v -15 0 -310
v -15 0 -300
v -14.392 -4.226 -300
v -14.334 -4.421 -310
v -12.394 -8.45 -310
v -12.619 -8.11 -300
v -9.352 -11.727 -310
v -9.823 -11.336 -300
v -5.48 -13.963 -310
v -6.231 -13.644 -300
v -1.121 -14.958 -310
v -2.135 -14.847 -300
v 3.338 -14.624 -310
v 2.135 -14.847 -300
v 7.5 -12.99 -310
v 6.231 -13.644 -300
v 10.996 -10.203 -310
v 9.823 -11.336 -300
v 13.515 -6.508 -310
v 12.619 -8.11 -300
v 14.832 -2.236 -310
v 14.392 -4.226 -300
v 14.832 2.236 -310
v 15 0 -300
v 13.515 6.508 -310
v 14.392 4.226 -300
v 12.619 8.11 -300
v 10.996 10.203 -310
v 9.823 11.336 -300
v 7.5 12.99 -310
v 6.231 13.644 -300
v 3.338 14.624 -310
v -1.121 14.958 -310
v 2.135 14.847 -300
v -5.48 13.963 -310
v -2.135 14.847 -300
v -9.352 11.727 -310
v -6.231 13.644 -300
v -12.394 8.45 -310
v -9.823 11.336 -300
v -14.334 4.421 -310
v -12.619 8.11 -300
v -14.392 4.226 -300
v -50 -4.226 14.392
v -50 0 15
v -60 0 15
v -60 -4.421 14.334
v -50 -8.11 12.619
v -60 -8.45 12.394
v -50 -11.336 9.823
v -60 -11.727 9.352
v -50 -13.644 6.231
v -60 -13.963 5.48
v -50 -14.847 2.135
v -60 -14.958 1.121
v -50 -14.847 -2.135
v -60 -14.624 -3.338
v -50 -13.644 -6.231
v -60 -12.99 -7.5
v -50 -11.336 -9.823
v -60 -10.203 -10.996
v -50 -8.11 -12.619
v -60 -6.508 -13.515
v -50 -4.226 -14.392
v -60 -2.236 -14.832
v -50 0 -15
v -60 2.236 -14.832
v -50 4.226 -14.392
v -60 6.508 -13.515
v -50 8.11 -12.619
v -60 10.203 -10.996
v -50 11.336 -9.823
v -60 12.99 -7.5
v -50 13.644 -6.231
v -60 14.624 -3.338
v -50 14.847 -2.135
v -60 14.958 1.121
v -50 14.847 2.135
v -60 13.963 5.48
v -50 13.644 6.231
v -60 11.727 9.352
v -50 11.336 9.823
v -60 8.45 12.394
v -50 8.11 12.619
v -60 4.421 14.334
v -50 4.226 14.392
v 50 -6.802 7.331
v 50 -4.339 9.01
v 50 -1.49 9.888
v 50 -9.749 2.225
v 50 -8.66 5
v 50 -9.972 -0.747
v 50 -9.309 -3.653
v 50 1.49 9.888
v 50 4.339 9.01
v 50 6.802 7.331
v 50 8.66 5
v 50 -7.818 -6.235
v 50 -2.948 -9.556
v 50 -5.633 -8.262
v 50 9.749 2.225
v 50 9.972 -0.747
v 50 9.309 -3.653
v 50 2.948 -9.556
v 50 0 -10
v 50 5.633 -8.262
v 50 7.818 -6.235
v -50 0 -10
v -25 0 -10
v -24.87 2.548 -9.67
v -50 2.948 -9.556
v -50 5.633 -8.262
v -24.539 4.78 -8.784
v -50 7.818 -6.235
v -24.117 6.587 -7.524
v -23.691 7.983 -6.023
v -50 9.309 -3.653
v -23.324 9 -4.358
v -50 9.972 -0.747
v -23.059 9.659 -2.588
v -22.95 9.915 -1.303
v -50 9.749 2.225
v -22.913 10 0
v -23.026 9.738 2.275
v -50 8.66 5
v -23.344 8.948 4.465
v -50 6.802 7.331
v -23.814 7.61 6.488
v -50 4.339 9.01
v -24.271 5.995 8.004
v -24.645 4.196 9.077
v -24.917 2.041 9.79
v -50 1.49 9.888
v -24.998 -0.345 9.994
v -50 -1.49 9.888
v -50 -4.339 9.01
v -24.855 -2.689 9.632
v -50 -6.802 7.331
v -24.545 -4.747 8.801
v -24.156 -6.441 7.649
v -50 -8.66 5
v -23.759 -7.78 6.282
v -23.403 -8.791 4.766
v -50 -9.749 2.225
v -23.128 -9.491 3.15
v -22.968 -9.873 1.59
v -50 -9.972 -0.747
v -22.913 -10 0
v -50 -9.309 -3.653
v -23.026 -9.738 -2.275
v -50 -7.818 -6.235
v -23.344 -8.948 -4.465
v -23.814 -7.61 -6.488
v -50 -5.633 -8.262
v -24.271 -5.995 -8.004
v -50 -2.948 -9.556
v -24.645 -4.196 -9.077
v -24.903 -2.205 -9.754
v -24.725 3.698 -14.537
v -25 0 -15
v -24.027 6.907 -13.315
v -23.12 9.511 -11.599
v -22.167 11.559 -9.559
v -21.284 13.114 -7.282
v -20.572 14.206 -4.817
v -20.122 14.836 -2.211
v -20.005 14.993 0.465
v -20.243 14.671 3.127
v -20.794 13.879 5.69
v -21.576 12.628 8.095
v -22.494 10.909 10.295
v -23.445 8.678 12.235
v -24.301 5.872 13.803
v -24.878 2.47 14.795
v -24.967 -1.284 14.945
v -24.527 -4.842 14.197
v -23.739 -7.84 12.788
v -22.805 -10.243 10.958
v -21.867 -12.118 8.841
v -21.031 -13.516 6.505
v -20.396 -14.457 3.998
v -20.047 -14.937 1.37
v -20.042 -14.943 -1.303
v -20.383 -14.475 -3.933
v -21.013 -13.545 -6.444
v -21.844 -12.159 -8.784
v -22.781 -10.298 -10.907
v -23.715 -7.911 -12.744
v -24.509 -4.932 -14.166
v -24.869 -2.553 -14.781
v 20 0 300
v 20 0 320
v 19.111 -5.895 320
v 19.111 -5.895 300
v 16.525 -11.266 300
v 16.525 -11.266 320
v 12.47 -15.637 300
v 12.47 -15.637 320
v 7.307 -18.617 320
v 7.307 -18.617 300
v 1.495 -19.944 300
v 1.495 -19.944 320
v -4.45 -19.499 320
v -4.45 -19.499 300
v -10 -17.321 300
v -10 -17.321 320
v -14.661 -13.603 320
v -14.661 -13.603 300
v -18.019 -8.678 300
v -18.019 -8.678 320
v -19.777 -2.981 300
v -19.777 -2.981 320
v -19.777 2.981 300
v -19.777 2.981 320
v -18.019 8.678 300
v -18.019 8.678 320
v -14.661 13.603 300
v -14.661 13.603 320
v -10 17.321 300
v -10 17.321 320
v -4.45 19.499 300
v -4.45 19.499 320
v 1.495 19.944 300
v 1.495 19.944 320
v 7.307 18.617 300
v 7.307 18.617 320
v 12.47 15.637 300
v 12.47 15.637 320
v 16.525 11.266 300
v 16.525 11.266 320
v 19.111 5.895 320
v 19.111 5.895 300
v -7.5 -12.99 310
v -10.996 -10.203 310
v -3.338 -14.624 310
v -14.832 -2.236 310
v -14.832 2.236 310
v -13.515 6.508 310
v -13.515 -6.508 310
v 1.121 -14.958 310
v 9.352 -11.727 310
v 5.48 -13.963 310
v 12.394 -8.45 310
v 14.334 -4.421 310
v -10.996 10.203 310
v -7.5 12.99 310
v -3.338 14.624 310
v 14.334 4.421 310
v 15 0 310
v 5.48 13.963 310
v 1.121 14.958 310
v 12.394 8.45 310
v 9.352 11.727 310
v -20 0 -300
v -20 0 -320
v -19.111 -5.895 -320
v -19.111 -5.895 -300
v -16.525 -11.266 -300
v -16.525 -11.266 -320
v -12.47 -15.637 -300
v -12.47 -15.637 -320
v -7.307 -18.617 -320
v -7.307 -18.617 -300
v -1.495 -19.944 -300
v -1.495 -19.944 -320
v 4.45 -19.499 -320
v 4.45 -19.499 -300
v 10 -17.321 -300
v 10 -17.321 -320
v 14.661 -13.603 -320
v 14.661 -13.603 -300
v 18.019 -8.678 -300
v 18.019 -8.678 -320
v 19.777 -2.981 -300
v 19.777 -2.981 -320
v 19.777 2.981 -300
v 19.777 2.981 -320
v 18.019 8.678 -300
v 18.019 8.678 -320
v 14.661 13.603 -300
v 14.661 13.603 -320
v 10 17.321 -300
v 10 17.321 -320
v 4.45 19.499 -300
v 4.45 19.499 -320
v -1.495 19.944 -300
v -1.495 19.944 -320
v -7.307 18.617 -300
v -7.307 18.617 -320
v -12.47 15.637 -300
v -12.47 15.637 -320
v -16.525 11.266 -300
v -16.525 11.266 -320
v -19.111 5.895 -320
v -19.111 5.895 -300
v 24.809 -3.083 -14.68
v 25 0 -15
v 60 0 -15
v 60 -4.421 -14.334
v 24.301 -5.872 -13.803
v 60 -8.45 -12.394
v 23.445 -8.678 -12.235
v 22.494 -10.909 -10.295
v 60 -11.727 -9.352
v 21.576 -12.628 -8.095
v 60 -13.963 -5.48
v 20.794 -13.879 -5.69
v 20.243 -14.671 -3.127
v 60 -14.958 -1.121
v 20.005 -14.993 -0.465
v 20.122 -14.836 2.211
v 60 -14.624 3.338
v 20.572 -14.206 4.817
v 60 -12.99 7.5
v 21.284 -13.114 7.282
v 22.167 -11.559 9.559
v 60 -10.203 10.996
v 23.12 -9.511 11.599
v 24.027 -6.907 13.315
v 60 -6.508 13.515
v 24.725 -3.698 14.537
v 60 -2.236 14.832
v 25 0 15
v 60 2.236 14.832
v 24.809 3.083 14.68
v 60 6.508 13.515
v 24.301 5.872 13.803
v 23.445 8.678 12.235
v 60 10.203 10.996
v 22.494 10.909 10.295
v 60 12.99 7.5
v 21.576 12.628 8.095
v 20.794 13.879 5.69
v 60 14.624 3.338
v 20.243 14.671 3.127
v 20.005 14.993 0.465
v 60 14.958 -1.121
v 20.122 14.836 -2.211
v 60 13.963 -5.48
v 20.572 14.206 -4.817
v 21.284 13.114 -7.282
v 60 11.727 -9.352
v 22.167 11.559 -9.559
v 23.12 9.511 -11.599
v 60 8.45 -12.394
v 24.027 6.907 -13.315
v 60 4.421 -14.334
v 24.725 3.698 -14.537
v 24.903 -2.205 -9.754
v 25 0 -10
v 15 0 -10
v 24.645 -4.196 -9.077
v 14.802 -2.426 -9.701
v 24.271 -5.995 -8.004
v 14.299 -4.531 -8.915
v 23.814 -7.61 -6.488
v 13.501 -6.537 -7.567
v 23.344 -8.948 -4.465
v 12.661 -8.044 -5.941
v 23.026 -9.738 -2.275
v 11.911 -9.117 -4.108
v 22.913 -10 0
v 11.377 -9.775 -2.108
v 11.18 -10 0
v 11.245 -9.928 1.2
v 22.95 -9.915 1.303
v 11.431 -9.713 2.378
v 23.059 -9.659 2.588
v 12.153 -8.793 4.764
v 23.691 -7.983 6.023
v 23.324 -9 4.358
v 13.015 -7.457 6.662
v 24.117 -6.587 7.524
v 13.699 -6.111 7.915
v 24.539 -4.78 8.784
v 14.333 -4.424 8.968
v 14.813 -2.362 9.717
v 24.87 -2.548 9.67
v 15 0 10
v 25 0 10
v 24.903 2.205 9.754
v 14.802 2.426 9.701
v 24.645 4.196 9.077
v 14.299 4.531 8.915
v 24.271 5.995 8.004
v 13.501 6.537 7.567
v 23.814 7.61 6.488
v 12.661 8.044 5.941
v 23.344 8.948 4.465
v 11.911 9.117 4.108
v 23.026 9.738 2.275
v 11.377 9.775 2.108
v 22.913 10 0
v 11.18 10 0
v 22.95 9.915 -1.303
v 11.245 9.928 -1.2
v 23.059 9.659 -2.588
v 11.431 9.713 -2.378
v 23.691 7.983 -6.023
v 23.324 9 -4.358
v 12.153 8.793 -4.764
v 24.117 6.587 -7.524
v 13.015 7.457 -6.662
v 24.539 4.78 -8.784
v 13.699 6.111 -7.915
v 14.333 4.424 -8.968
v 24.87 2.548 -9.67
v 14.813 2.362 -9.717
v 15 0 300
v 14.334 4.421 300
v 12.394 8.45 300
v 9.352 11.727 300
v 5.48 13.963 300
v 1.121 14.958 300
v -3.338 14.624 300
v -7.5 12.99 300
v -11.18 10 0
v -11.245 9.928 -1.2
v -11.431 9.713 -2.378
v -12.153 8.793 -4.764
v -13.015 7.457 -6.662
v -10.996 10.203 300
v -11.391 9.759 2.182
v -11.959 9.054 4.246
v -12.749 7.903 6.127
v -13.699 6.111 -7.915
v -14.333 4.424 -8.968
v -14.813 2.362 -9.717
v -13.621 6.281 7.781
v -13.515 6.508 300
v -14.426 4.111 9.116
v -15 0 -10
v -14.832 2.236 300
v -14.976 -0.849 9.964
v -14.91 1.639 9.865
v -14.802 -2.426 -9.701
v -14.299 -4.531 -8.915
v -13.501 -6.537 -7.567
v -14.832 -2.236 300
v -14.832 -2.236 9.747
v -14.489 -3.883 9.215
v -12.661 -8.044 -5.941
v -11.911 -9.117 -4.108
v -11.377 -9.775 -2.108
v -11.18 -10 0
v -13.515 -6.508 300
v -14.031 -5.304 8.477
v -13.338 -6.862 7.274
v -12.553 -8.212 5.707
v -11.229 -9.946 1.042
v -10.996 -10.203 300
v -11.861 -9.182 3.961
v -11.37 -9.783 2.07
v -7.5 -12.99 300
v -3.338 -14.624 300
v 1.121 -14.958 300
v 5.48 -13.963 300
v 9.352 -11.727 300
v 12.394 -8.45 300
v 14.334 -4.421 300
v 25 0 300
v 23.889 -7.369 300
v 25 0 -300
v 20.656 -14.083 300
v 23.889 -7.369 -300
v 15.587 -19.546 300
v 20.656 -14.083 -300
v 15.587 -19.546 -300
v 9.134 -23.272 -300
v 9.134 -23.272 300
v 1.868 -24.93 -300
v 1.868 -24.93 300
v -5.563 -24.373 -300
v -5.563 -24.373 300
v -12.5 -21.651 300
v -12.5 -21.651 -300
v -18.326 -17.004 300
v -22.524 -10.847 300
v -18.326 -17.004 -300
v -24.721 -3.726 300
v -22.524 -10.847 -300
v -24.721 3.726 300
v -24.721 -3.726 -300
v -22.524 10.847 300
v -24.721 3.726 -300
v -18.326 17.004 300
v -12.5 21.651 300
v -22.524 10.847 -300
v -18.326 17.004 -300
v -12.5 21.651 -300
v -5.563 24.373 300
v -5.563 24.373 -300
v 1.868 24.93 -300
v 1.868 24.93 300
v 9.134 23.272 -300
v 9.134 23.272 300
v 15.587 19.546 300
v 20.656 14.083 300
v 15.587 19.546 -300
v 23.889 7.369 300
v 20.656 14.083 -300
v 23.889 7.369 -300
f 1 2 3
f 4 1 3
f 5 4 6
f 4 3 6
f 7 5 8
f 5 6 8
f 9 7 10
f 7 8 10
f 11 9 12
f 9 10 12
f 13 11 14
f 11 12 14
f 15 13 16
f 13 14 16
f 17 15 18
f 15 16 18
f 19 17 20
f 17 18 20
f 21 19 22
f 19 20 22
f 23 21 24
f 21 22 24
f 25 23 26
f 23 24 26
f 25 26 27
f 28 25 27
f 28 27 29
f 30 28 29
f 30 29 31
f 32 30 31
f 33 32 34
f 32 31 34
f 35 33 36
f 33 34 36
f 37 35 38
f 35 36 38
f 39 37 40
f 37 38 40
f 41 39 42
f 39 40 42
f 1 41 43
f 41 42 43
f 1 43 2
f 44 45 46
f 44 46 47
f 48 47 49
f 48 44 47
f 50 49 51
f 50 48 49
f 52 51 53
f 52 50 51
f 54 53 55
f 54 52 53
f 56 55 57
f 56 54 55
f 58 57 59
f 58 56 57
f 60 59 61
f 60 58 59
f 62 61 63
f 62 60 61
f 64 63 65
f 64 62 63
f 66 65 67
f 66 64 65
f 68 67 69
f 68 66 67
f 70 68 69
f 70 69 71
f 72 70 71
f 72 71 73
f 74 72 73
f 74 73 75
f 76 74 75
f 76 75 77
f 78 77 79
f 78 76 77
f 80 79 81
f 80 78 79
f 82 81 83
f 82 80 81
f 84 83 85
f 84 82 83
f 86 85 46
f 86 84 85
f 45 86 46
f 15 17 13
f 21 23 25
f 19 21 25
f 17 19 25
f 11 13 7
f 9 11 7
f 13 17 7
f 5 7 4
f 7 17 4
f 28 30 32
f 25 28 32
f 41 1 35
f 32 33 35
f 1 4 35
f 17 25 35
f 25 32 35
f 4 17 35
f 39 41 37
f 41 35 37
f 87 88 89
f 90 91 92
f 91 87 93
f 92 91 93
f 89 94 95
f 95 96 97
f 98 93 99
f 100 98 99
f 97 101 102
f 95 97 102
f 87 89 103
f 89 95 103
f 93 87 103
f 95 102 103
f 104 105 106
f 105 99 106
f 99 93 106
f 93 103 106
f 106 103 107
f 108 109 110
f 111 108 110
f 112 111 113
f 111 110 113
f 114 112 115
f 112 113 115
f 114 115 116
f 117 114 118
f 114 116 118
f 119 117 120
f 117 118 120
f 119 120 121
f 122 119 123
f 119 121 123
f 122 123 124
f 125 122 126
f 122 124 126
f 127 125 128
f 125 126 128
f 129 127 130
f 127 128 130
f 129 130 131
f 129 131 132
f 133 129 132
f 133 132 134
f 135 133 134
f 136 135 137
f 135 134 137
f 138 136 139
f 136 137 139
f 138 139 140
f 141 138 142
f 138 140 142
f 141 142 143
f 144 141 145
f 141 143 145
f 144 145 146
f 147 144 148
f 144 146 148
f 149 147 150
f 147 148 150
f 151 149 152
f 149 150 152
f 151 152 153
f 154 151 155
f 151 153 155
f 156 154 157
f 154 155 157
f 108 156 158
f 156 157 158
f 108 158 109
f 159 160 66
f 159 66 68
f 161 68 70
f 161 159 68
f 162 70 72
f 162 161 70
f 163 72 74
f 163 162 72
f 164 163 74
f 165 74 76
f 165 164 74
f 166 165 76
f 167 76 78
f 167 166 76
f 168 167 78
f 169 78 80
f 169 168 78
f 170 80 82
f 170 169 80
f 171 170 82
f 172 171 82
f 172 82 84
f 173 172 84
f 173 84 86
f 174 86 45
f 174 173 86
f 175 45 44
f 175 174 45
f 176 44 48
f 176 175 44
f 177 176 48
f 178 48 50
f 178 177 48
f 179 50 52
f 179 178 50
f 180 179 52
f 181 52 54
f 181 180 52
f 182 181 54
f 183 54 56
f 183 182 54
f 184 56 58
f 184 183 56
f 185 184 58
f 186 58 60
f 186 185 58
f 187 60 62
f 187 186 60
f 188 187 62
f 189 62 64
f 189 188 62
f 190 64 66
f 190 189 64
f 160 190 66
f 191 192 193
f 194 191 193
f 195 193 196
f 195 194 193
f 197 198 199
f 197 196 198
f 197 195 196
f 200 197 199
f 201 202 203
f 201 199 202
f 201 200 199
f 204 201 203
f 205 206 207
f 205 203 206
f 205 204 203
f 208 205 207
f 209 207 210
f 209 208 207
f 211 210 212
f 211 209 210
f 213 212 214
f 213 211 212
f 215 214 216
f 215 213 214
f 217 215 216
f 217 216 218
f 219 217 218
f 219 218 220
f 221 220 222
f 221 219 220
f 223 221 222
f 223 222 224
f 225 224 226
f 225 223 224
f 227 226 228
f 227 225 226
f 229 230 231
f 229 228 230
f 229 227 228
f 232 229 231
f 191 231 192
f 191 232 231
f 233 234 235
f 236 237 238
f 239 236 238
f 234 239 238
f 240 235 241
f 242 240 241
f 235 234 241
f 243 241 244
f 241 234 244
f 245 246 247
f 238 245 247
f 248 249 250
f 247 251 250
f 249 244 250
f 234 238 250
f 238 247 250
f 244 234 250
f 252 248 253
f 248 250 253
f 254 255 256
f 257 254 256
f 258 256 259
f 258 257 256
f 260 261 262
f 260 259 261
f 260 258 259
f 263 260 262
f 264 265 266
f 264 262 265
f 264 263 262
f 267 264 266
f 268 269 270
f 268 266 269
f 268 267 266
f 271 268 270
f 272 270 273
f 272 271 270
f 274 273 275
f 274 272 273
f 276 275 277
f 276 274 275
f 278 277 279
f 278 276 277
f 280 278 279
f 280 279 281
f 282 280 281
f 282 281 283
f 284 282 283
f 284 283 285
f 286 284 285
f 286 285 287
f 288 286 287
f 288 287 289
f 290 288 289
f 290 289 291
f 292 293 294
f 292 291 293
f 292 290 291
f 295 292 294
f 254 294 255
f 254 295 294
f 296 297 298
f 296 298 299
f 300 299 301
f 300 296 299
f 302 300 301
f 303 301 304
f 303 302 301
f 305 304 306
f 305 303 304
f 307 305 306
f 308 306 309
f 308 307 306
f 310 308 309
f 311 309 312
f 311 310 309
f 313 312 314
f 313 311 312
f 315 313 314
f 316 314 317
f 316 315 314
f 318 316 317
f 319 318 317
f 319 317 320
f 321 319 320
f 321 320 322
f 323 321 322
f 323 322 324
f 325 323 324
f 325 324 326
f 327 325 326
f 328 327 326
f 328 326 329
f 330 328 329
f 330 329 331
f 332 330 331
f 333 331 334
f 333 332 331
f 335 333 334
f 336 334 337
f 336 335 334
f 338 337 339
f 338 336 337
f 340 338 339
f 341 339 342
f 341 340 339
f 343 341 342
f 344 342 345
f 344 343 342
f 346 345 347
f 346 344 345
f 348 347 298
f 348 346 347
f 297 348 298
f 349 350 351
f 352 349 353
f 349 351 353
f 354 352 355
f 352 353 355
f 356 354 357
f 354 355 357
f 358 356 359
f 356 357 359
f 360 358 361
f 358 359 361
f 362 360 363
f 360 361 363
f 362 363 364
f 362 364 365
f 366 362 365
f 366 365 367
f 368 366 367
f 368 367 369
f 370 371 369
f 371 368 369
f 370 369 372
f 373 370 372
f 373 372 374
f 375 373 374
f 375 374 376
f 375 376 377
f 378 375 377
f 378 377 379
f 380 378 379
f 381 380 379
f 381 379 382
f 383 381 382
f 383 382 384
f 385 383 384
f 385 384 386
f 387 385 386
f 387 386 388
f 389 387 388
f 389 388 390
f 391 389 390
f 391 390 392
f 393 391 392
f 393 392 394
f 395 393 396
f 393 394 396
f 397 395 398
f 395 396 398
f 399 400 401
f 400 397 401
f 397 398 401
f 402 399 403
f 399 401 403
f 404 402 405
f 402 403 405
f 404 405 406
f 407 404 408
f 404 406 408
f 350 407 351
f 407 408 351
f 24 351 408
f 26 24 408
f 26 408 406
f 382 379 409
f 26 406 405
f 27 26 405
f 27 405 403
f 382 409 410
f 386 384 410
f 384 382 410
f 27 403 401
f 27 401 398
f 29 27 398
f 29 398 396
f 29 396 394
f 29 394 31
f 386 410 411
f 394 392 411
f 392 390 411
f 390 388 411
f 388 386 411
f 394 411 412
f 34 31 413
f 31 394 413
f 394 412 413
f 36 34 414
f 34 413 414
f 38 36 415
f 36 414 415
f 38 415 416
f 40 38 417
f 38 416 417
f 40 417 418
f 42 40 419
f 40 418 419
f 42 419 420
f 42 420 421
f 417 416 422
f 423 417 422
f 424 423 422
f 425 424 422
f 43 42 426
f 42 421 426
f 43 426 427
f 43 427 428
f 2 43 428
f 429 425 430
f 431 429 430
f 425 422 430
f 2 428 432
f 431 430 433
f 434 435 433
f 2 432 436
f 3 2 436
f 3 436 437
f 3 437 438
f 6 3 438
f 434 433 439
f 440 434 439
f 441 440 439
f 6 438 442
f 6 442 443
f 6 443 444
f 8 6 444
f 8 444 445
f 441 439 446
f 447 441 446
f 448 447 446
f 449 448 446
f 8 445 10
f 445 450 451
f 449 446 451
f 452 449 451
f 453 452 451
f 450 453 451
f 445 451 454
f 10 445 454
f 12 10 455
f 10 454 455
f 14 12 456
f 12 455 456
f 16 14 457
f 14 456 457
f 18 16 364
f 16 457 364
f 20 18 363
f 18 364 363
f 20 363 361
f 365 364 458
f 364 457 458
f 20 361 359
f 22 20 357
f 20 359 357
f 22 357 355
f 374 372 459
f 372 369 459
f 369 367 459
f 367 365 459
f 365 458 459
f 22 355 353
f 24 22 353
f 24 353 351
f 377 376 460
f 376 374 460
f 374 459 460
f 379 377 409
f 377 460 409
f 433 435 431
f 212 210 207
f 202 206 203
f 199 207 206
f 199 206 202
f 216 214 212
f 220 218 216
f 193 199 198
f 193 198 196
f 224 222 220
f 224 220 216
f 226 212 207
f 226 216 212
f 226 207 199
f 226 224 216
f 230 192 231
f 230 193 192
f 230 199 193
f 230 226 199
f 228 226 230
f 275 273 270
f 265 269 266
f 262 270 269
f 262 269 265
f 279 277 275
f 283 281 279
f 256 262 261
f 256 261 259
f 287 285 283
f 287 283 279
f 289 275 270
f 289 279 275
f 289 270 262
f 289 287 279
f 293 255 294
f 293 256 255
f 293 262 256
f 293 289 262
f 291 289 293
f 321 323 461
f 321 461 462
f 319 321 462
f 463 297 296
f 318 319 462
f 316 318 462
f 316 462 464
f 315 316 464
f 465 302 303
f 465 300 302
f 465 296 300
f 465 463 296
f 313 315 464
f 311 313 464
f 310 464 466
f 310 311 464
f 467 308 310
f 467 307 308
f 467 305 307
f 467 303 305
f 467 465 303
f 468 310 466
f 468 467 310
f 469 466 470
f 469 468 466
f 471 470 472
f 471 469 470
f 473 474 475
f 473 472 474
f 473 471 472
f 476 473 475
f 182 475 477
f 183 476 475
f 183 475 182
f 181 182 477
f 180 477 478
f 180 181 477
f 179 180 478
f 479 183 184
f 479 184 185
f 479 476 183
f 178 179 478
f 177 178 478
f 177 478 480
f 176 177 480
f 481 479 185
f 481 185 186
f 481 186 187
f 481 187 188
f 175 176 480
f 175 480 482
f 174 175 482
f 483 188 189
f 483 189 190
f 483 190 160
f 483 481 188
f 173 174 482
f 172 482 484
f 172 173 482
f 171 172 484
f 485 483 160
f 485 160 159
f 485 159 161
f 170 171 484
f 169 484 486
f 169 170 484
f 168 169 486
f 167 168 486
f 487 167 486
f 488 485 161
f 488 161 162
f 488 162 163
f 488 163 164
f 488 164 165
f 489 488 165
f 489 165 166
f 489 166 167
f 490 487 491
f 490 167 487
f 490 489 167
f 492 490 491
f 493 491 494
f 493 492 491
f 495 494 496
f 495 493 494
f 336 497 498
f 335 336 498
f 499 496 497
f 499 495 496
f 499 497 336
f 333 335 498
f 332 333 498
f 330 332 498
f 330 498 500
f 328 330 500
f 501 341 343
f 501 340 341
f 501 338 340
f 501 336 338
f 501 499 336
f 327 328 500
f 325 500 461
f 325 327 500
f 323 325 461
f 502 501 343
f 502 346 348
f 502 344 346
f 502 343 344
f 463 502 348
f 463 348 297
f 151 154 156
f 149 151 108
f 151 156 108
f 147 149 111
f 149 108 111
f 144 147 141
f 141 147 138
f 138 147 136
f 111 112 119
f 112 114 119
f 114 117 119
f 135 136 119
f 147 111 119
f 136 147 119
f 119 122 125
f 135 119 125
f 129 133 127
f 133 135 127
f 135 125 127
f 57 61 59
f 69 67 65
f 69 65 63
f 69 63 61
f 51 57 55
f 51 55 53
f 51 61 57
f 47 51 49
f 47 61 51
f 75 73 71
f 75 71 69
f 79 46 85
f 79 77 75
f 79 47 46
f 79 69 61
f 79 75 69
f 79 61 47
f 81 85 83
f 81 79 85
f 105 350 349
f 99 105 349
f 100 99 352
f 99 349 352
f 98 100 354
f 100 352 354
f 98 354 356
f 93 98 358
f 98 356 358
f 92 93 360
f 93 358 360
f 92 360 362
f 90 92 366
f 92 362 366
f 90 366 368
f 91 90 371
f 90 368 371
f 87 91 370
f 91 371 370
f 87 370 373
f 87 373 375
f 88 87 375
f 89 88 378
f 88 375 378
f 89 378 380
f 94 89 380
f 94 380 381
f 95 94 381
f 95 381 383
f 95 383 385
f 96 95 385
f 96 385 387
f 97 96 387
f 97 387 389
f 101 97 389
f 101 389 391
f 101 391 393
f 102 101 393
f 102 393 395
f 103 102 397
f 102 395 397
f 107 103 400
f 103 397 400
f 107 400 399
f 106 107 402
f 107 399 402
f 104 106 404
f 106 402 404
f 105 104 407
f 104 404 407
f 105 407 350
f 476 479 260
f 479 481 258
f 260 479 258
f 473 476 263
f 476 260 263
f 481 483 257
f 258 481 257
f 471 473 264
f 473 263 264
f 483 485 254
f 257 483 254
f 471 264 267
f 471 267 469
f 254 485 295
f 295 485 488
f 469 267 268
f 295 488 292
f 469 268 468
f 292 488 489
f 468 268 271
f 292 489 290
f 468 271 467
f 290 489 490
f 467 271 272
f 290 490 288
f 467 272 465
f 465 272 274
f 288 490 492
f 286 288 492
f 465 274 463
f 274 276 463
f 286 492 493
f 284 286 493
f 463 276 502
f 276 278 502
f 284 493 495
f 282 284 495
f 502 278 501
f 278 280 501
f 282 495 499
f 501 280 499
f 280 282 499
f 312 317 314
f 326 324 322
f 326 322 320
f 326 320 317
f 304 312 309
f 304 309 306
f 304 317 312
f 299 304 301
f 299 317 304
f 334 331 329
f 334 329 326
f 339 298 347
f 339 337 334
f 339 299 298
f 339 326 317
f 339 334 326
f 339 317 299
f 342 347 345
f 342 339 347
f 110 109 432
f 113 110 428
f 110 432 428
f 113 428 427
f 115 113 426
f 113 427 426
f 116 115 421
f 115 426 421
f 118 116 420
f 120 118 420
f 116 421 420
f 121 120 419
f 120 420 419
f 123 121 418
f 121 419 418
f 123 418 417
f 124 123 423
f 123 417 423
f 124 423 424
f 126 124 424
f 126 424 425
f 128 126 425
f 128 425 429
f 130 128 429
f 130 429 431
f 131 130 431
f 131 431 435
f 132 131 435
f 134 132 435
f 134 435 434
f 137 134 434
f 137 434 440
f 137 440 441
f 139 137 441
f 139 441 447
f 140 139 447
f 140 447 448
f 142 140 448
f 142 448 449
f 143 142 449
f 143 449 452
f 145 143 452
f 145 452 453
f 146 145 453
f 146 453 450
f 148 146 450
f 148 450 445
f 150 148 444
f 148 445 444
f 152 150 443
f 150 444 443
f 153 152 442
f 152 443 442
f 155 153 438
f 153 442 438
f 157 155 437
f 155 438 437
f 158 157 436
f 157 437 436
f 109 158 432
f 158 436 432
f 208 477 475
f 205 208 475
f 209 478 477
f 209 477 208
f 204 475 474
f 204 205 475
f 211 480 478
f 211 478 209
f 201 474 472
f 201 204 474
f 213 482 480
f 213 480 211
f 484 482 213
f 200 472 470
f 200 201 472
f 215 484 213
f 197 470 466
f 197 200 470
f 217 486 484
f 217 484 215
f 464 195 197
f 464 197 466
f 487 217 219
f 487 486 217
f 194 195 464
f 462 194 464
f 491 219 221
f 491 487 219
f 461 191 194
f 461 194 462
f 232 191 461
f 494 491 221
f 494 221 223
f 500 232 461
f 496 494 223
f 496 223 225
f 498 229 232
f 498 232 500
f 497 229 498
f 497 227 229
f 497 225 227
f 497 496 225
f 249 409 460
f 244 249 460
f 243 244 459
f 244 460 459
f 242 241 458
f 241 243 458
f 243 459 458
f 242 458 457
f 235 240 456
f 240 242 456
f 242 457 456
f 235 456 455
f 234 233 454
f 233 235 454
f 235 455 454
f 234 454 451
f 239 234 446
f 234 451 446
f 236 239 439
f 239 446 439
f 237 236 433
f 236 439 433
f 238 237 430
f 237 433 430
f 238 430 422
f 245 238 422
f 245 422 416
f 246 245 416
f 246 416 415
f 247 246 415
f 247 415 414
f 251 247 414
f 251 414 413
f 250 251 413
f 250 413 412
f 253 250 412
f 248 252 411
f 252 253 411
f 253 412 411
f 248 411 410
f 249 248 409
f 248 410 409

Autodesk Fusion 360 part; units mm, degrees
sketch "Sketch8" plane through (0, 0, 0) normal (0, 0, 1) x (1, 0, 0)
  circle A0 centre (0, 0) radius 15
  circle A1 centre (0, 0) radius 25
  dimension "d21" = 30
  dimension "d22" = 50
extrude "Extrude3" add sketch "Sketch8" along normal mid plane 600 makes body 1
sketch "Sketch9" plane through (0, 0, 0) normal (1, 0, 0) x (0, 0, -1)
  circle A0 centre (0, 0) radius 10
  circle A1 centre (0, 0) radius 15
  dimension "d25" = 20
  dimension "d26" = 30
extrude "Extrude4" cut sketch "Sketch9" along normal mid plane 100 contours A0 bodies 1
extrude "Extrude5" add sketch "Sketch9" along normal mid plane 100 separate body makes body 2
extrude "Extrude6" cut sketch "Sketch8" along normal mid plane 600 contours A0 bodies 2
combine "Combine1" operation add target body 1 tool bodies 2
sketch "Sketch10" plane through (0, 0, -300) normal (0, 0, -1) x (-1, 0, 0)
  circle A0 centre (0, 0) radius 15
  circle A1 centre (0, 0) radius 25
  circle A2 centre (0, 0) radius 15
  circle A3 centre (0, 0) radius 20
  dimension "d33" = 30
  dimension "d34" = 40
extrude "Extrude7" add sketch "Sketch10" along normal blind 10 contours A3 bodies 1
sketch "Sketch11" plane through (0, 0, 300) normal (0, 0, 1) x (1, 0, 0)
  circle A0 centre (0, 0) radius 15
  circle A1 centre (0, 0) radius 25
  circle A2 centre (0, 0) radius 15
  circle A3 centre (0, 0) radius 20
  dimension "d38" = 30
  dimension "d39" = 40
extrude "Extrude8" add sketch "Sketch11" along normal blind 10 contours A3 bodies 1
sketch "Sketch12" plane through (0, 0, -310) normal (0, 0, -1) x (-1, 0, 0)
  circle A0 centre (0, 0) radius 15
  circle A1 centre (0, 0) radius 20
  circle A2 centre (0, 0) radius 20
  dimension "d42" = 40
extrude "Extrude9" add sketch "Sketch12" along normal blind 10 contours A0 | A1 A2 bodies 1
sketch "Sketch13" plane through (0, 0, 310) normal (0, 0, 1) x (1, 0, 0)
  circle A0 centre (0, 0) radius 15
  circle A1 centre (0, 0) radius 20
  circle A2 centre (0, 0) radius 20
  dimension "d45" = 40
extrude "Extrude10" add sketch "Sketch13" along normal blind 10 contours A0 | A1 A2 bodies 1
sketch "Sketch14" plane through (-50, 0, 0) normal (-1, 0, 0) x (0, 0, 1)
  circle A0 centre (0, 0) radius 10
  circle A1 centre (0, 0) radius 15
  circle A2 centre (0, 0) radius 15
  dimension "d48" = 30
extrude "Extrude11" add sketch "Sketch14" along normal blind 10 contours A0 | A1 A2 bodies 1
sketch "Sketch15" plane through (50, 0, 0) normal (1, 0, 0) x (0, 0, -1)
  circle A0 centre (0, 0) radius 10
  circle A1 centre (0, 0) radius 15
  circle A2 centre (0, 0) radius 15
  dimension "d51" = 30
extrude "Extrude12" add sketch "Sketch15" along normal blind 10 contours A0 | A1 A2 bodies 1
equation "LC_id = 30 mm" comment "Long Cylinder inner diameter"
equation "LC_od = 50 mm" comment "Long Cylinder outer diameter"
equation "SC_id = 20 mm" comment "Small arm Cylinder inner diameter"
equation "SC_od = 30 mm" comment "Small arm Cylinder outer diameter"
equation "LC_l = 300 mm" comment "Long Cylinder length"
equation "SC_l = 50 mm" comment "Short arm Cylinder length"
equation "SC_c = LC_l / 2.0" comment "Short arm Cylinder position (center of long cylinder length)"
equation "LC_w_id = LC_id" comment "lONG Cylinder cold window inner diameter"
equation "LC_w_od = 1.0 / 2.0 * ( LC_od + LC_id )" comment "Long Cylinder window outer diameter"
equation "d21 = LC_id"
equation "d22 = LC_od"
equation "d23 = LC_l"
equation "d25 = SC_id"
equation "d26 = SC_od"
equation "d27 = SC_l"
equation "d29 = SC_l"
equation "d31 = LC_l"
equation "d33 = LC_w_id"
equation "d34 = LC_w_od"
equation "LC_w_l = 10 mm" comment "Lenth of LC window cold tube"
equation "d36 = LC_w_l"
equation "d38 = LC_w_id"
equation "d39 = LC_w_od"
equation "d40 = LC_w_l"
equation "d42 = LC_w_od"
equation "d45 = LC_w_od"
equation "d48 = SC_od"
equation "d51 = SC_od"
properties part number "Configuration 3"
